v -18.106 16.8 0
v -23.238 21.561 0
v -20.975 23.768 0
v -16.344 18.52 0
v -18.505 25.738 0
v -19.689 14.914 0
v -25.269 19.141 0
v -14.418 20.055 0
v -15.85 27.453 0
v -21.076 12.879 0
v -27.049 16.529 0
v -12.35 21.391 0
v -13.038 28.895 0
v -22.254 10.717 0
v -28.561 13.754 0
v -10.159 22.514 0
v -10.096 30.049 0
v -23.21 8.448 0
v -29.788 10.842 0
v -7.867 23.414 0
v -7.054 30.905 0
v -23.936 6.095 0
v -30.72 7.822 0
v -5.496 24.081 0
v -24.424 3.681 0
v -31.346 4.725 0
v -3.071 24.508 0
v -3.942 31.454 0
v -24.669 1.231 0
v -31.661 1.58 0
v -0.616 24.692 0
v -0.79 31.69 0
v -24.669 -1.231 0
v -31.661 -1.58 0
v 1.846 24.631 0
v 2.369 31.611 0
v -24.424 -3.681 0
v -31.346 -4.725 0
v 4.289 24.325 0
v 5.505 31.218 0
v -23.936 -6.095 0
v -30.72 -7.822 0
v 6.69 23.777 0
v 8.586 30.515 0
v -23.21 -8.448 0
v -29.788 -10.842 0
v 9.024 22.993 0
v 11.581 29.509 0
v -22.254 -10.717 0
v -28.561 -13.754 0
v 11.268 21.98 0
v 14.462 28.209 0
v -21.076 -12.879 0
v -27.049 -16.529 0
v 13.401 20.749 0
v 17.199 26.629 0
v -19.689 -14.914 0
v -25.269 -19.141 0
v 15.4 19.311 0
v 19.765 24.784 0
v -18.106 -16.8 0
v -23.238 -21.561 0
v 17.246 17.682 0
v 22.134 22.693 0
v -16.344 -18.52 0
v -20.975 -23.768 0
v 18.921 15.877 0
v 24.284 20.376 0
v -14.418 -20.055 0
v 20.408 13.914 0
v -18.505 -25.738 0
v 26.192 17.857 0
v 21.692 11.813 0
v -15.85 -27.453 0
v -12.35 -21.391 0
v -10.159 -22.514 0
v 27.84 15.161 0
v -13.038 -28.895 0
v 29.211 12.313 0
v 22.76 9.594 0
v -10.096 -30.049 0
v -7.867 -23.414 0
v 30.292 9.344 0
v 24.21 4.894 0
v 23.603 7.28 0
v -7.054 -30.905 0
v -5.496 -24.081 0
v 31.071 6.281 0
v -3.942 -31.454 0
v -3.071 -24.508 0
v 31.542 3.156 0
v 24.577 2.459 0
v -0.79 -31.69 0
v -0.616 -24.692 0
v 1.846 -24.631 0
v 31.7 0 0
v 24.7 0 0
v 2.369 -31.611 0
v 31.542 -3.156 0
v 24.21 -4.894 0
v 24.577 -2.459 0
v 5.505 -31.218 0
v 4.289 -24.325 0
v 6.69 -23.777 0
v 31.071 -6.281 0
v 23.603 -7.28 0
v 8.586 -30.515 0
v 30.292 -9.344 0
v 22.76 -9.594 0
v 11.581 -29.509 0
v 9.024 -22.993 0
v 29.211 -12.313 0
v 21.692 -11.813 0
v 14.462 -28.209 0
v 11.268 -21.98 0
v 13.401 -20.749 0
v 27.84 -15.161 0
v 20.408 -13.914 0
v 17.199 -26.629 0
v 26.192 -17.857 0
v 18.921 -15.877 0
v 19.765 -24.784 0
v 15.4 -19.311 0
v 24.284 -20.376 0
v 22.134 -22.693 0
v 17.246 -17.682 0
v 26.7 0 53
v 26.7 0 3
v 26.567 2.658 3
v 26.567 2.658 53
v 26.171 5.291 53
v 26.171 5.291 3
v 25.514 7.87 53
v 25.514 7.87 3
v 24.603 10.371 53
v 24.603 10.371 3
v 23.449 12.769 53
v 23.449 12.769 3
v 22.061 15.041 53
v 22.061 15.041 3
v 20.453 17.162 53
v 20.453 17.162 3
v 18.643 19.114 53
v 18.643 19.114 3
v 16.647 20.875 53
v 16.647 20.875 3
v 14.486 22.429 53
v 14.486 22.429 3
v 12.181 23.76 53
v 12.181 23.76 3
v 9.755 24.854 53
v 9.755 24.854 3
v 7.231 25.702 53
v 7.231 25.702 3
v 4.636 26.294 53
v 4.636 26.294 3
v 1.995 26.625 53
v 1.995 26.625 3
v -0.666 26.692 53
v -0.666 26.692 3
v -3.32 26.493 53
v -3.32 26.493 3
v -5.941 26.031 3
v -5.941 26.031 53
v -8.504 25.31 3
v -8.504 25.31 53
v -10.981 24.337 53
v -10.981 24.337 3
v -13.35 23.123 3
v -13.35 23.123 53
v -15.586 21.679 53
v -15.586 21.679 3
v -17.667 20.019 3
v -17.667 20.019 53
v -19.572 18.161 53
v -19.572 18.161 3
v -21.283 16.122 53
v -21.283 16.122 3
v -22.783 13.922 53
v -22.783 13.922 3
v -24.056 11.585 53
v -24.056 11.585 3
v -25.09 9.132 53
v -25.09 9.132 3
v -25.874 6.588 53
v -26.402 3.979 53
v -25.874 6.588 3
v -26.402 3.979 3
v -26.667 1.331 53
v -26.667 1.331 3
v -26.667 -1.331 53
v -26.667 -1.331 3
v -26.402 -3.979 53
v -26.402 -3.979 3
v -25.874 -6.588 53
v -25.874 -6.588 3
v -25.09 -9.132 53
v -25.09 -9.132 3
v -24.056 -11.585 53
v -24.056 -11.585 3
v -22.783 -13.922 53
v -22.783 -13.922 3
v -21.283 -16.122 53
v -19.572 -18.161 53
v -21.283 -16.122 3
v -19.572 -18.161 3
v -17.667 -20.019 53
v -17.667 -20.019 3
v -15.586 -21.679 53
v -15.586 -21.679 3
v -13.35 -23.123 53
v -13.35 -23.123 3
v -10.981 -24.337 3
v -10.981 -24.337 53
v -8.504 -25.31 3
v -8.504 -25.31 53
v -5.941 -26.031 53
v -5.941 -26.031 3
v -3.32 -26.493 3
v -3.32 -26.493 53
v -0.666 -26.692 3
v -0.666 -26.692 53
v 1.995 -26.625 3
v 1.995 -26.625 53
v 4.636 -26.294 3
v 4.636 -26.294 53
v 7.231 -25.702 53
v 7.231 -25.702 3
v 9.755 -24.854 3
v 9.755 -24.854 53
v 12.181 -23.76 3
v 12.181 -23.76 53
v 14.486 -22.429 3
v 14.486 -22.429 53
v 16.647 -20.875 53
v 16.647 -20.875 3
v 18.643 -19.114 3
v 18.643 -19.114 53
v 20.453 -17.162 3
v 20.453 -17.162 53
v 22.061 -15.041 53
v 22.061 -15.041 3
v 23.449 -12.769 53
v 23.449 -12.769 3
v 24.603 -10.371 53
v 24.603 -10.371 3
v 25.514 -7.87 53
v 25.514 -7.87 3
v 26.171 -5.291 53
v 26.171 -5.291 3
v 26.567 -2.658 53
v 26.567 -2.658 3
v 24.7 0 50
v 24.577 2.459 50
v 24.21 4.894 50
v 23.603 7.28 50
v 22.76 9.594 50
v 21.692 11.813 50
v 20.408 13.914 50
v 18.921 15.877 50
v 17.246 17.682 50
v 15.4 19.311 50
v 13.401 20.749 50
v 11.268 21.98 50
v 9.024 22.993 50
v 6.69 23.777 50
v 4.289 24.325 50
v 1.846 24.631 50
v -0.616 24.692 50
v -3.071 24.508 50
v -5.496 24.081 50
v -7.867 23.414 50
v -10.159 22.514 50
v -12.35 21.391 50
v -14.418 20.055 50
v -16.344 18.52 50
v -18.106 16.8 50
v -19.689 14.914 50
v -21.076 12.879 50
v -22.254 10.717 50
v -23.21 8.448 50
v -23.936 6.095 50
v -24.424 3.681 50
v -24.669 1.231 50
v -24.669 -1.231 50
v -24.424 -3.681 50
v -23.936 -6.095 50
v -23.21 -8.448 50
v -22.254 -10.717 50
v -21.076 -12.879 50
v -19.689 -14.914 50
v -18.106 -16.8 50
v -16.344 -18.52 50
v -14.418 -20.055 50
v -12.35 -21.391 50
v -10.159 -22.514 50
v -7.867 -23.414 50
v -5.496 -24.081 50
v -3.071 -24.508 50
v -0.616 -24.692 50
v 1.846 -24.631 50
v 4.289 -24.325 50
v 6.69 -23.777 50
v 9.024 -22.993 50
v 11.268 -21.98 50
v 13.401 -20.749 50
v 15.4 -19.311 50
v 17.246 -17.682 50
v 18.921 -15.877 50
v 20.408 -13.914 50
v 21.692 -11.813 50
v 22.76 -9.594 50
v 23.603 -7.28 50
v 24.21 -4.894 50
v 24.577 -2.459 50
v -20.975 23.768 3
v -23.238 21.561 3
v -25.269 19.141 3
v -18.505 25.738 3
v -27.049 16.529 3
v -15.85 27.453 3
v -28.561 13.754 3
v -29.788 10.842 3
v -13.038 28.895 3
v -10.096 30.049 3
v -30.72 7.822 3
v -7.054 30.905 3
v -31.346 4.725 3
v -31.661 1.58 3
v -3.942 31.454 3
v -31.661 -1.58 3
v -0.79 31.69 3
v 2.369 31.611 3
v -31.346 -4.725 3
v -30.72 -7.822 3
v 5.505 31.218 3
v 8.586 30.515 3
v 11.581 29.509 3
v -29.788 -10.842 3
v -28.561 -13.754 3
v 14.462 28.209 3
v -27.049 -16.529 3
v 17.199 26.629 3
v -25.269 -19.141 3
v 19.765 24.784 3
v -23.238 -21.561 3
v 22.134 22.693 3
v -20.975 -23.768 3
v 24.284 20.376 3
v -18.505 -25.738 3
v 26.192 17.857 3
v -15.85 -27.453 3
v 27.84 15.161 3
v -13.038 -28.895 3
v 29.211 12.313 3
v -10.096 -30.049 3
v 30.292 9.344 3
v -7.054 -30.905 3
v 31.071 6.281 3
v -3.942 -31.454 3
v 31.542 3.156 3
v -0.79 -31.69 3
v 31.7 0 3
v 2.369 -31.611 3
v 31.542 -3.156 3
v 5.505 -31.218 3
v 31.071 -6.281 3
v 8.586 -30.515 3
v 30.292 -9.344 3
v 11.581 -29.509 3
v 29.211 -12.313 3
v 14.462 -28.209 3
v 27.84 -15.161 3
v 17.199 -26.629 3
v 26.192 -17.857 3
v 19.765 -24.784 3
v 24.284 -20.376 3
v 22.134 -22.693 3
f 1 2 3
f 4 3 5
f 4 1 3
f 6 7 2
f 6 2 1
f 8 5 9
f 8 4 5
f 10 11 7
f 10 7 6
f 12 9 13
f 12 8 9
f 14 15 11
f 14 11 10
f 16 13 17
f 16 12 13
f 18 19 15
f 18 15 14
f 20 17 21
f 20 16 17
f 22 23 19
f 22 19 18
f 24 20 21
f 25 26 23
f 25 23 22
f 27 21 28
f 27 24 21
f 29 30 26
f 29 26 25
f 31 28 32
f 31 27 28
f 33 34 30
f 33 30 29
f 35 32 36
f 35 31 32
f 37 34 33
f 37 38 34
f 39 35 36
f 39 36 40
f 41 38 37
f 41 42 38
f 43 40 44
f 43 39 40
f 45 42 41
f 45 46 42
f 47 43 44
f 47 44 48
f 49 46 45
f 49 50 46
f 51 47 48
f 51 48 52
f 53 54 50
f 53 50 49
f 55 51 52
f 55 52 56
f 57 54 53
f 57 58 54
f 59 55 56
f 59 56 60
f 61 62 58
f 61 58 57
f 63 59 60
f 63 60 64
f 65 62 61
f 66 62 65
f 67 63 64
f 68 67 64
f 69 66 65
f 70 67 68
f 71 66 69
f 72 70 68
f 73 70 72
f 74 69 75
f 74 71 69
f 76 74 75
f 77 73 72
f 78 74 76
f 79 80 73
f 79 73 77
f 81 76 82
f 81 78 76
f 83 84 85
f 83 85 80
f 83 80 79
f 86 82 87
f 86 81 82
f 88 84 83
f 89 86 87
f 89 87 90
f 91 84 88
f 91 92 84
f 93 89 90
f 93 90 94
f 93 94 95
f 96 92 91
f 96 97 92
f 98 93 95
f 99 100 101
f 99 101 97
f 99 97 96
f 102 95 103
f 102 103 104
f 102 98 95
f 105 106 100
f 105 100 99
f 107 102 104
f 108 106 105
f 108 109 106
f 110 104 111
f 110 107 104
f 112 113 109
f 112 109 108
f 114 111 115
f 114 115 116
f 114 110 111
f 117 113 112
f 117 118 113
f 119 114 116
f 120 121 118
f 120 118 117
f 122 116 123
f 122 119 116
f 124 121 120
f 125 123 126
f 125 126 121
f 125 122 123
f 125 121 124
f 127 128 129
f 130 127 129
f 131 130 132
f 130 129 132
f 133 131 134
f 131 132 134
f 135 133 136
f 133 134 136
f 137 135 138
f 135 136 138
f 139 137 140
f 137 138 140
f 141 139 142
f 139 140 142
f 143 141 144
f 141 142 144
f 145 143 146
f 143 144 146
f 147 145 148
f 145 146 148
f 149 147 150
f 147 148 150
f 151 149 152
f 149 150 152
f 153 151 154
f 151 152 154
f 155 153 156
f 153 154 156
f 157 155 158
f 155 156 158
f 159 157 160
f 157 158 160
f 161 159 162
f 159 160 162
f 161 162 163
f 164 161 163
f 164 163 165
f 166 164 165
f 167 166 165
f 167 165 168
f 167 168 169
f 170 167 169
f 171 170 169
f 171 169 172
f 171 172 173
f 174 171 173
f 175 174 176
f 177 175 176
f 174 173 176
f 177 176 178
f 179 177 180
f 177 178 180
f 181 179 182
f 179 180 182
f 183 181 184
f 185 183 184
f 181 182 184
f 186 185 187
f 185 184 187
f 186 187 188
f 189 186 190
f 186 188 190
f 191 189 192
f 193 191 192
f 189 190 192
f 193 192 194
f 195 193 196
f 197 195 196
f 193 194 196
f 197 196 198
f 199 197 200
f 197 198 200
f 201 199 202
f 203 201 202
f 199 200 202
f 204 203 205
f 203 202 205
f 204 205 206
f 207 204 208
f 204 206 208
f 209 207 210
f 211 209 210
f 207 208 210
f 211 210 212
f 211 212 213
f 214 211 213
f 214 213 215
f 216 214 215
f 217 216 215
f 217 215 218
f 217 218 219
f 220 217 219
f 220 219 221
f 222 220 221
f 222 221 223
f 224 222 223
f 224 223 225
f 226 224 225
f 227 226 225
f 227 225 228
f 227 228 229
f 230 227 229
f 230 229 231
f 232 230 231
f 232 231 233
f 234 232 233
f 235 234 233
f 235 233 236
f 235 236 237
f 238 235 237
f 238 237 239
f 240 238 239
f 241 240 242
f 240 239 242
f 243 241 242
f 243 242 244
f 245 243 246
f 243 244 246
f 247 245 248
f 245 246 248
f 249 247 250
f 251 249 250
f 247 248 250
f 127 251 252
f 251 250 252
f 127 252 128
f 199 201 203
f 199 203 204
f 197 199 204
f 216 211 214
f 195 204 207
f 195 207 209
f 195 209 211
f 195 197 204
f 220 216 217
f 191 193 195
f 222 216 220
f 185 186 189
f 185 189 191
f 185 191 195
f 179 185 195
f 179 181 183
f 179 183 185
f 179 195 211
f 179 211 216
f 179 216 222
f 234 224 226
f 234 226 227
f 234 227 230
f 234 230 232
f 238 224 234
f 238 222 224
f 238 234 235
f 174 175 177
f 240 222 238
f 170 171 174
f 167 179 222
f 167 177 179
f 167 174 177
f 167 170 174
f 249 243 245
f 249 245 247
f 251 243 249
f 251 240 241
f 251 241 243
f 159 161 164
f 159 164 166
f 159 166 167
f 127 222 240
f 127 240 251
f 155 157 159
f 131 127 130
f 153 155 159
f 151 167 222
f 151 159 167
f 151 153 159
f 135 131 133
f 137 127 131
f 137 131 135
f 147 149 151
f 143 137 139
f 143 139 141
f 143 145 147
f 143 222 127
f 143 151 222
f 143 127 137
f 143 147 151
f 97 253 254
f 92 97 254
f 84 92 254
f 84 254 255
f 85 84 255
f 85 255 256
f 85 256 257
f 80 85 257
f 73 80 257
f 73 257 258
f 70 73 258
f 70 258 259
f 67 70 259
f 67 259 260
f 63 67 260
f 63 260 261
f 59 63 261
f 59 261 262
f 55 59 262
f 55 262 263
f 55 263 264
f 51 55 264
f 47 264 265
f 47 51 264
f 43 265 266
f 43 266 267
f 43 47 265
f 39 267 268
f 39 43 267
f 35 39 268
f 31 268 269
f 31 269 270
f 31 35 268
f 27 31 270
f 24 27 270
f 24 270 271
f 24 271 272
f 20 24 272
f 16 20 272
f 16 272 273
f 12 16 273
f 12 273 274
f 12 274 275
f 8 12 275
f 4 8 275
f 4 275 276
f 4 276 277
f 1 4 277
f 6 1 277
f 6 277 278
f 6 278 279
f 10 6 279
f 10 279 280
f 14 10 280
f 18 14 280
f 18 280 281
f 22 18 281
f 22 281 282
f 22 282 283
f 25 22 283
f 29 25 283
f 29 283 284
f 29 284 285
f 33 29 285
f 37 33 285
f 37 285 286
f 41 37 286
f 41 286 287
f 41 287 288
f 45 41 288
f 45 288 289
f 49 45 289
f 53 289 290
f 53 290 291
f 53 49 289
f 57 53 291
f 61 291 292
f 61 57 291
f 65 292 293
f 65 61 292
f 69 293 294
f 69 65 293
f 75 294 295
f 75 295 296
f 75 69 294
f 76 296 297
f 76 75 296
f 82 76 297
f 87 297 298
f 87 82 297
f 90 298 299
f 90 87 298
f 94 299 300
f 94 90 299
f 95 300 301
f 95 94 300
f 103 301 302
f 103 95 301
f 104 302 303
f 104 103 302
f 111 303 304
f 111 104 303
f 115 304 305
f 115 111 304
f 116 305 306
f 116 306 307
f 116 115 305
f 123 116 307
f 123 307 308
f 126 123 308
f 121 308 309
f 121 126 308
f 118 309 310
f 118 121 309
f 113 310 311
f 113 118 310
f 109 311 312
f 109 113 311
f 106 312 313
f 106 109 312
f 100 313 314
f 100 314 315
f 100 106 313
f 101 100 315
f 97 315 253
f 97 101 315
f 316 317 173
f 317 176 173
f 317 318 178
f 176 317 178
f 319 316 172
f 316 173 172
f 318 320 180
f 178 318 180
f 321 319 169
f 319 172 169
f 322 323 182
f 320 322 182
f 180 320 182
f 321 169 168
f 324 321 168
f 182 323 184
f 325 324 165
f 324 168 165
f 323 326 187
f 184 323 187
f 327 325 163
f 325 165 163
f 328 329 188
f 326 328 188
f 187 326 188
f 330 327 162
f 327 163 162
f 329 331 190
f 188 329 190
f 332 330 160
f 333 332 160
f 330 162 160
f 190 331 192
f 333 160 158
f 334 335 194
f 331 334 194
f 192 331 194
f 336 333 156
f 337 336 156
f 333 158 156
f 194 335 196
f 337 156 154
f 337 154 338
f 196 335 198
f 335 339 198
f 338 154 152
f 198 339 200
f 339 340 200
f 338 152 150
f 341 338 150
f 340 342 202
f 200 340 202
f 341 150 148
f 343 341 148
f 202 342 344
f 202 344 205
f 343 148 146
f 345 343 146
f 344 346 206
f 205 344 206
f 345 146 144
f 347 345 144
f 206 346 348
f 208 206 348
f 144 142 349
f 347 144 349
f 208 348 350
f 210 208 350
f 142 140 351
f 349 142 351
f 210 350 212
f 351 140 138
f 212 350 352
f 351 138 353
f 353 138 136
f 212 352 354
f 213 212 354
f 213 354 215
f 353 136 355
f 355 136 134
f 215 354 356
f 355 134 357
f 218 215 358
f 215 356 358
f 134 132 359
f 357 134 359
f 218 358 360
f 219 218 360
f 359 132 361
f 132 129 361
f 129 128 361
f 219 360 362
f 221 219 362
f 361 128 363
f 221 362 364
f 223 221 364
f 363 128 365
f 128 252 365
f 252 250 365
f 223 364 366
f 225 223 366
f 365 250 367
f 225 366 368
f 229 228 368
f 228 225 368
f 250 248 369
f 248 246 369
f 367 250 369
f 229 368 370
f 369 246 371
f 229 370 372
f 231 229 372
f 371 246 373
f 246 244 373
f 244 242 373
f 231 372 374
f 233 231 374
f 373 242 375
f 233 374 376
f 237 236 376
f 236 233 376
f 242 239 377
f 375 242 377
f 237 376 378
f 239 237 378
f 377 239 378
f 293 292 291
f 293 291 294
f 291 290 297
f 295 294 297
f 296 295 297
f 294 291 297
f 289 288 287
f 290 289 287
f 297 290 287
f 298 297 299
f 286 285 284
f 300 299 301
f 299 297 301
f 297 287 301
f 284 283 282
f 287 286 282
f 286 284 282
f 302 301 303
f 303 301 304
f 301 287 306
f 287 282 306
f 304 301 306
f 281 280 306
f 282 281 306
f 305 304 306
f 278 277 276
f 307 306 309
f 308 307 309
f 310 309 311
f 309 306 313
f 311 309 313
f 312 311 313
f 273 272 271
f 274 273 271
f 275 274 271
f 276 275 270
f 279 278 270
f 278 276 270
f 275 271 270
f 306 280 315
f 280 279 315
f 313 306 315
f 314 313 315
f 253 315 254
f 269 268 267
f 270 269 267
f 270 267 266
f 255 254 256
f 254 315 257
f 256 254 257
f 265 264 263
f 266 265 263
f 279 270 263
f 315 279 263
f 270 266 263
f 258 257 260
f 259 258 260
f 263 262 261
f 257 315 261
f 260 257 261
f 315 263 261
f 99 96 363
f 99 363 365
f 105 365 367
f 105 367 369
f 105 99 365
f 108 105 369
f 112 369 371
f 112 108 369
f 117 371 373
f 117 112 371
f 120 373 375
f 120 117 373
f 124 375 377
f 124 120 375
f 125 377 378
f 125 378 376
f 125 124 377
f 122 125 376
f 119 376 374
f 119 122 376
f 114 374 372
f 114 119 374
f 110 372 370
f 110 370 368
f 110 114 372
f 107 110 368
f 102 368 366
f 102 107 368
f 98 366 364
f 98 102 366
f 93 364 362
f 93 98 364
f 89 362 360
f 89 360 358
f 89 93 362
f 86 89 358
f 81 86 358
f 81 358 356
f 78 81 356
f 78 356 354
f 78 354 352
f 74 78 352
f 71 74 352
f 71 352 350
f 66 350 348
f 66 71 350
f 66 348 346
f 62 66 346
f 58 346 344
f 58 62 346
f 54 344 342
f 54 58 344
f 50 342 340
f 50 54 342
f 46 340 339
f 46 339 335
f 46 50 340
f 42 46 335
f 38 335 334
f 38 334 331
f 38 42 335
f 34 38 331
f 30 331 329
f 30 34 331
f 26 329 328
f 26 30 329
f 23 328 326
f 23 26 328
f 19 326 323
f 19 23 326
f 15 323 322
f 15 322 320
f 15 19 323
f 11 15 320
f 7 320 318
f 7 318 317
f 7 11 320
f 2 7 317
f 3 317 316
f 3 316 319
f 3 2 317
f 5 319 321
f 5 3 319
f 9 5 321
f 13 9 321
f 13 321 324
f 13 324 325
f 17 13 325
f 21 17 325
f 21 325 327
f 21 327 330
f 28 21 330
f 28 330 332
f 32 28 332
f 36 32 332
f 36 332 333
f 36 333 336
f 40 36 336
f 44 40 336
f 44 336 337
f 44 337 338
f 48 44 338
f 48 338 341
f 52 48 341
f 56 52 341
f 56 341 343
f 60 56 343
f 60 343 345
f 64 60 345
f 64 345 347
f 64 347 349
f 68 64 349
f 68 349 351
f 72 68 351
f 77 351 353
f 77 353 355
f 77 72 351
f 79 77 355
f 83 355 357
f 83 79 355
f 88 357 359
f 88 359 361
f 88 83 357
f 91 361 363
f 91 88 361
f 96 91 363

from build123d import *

# Parameters (mm, degrees)
F0_R     = 26.7
F0_R_2   = 24.7
F1_DEPTH = 50
F2_R     = 26.7
F3_DEPTH = 3
F4_R     = 31.7
F4_R_2   = 26.7
F4_R_3   = 24.7
F5_DEPTH = 3


with BuildPart() as f1:
    # F0 (on Top) → F1 (new body)
    with BuildSketch(Plane.XY):
        Circle(F0_R)
        Circle(F0_R_2, mode=Mode.SUBTRACT)
    extrude(amount=F1_DEPTH)

    # F2 (on face) → F3 (join)
    with BuildSketch(Plane.XY.offset(50)):
        Circle(F2_R)
    extrude(amount=F3_DEPTH)

    # F4 (on face) → F5 (join)
    with BuildSketch(Plane(origin=(0, 0, 0), x_dir=(1, 0, 0), z_dir=(0, 0, -1))):
        Circle(F4_R)
        Circle(F4_R_2, mode=Mode.SUBTRACT)
        Circle(F4_R_2)
        Circle(F4_R_3, mode=Mode.SUBTRACT)
    extrude(amount=-F5_DEPTH)


solid = f1.part
